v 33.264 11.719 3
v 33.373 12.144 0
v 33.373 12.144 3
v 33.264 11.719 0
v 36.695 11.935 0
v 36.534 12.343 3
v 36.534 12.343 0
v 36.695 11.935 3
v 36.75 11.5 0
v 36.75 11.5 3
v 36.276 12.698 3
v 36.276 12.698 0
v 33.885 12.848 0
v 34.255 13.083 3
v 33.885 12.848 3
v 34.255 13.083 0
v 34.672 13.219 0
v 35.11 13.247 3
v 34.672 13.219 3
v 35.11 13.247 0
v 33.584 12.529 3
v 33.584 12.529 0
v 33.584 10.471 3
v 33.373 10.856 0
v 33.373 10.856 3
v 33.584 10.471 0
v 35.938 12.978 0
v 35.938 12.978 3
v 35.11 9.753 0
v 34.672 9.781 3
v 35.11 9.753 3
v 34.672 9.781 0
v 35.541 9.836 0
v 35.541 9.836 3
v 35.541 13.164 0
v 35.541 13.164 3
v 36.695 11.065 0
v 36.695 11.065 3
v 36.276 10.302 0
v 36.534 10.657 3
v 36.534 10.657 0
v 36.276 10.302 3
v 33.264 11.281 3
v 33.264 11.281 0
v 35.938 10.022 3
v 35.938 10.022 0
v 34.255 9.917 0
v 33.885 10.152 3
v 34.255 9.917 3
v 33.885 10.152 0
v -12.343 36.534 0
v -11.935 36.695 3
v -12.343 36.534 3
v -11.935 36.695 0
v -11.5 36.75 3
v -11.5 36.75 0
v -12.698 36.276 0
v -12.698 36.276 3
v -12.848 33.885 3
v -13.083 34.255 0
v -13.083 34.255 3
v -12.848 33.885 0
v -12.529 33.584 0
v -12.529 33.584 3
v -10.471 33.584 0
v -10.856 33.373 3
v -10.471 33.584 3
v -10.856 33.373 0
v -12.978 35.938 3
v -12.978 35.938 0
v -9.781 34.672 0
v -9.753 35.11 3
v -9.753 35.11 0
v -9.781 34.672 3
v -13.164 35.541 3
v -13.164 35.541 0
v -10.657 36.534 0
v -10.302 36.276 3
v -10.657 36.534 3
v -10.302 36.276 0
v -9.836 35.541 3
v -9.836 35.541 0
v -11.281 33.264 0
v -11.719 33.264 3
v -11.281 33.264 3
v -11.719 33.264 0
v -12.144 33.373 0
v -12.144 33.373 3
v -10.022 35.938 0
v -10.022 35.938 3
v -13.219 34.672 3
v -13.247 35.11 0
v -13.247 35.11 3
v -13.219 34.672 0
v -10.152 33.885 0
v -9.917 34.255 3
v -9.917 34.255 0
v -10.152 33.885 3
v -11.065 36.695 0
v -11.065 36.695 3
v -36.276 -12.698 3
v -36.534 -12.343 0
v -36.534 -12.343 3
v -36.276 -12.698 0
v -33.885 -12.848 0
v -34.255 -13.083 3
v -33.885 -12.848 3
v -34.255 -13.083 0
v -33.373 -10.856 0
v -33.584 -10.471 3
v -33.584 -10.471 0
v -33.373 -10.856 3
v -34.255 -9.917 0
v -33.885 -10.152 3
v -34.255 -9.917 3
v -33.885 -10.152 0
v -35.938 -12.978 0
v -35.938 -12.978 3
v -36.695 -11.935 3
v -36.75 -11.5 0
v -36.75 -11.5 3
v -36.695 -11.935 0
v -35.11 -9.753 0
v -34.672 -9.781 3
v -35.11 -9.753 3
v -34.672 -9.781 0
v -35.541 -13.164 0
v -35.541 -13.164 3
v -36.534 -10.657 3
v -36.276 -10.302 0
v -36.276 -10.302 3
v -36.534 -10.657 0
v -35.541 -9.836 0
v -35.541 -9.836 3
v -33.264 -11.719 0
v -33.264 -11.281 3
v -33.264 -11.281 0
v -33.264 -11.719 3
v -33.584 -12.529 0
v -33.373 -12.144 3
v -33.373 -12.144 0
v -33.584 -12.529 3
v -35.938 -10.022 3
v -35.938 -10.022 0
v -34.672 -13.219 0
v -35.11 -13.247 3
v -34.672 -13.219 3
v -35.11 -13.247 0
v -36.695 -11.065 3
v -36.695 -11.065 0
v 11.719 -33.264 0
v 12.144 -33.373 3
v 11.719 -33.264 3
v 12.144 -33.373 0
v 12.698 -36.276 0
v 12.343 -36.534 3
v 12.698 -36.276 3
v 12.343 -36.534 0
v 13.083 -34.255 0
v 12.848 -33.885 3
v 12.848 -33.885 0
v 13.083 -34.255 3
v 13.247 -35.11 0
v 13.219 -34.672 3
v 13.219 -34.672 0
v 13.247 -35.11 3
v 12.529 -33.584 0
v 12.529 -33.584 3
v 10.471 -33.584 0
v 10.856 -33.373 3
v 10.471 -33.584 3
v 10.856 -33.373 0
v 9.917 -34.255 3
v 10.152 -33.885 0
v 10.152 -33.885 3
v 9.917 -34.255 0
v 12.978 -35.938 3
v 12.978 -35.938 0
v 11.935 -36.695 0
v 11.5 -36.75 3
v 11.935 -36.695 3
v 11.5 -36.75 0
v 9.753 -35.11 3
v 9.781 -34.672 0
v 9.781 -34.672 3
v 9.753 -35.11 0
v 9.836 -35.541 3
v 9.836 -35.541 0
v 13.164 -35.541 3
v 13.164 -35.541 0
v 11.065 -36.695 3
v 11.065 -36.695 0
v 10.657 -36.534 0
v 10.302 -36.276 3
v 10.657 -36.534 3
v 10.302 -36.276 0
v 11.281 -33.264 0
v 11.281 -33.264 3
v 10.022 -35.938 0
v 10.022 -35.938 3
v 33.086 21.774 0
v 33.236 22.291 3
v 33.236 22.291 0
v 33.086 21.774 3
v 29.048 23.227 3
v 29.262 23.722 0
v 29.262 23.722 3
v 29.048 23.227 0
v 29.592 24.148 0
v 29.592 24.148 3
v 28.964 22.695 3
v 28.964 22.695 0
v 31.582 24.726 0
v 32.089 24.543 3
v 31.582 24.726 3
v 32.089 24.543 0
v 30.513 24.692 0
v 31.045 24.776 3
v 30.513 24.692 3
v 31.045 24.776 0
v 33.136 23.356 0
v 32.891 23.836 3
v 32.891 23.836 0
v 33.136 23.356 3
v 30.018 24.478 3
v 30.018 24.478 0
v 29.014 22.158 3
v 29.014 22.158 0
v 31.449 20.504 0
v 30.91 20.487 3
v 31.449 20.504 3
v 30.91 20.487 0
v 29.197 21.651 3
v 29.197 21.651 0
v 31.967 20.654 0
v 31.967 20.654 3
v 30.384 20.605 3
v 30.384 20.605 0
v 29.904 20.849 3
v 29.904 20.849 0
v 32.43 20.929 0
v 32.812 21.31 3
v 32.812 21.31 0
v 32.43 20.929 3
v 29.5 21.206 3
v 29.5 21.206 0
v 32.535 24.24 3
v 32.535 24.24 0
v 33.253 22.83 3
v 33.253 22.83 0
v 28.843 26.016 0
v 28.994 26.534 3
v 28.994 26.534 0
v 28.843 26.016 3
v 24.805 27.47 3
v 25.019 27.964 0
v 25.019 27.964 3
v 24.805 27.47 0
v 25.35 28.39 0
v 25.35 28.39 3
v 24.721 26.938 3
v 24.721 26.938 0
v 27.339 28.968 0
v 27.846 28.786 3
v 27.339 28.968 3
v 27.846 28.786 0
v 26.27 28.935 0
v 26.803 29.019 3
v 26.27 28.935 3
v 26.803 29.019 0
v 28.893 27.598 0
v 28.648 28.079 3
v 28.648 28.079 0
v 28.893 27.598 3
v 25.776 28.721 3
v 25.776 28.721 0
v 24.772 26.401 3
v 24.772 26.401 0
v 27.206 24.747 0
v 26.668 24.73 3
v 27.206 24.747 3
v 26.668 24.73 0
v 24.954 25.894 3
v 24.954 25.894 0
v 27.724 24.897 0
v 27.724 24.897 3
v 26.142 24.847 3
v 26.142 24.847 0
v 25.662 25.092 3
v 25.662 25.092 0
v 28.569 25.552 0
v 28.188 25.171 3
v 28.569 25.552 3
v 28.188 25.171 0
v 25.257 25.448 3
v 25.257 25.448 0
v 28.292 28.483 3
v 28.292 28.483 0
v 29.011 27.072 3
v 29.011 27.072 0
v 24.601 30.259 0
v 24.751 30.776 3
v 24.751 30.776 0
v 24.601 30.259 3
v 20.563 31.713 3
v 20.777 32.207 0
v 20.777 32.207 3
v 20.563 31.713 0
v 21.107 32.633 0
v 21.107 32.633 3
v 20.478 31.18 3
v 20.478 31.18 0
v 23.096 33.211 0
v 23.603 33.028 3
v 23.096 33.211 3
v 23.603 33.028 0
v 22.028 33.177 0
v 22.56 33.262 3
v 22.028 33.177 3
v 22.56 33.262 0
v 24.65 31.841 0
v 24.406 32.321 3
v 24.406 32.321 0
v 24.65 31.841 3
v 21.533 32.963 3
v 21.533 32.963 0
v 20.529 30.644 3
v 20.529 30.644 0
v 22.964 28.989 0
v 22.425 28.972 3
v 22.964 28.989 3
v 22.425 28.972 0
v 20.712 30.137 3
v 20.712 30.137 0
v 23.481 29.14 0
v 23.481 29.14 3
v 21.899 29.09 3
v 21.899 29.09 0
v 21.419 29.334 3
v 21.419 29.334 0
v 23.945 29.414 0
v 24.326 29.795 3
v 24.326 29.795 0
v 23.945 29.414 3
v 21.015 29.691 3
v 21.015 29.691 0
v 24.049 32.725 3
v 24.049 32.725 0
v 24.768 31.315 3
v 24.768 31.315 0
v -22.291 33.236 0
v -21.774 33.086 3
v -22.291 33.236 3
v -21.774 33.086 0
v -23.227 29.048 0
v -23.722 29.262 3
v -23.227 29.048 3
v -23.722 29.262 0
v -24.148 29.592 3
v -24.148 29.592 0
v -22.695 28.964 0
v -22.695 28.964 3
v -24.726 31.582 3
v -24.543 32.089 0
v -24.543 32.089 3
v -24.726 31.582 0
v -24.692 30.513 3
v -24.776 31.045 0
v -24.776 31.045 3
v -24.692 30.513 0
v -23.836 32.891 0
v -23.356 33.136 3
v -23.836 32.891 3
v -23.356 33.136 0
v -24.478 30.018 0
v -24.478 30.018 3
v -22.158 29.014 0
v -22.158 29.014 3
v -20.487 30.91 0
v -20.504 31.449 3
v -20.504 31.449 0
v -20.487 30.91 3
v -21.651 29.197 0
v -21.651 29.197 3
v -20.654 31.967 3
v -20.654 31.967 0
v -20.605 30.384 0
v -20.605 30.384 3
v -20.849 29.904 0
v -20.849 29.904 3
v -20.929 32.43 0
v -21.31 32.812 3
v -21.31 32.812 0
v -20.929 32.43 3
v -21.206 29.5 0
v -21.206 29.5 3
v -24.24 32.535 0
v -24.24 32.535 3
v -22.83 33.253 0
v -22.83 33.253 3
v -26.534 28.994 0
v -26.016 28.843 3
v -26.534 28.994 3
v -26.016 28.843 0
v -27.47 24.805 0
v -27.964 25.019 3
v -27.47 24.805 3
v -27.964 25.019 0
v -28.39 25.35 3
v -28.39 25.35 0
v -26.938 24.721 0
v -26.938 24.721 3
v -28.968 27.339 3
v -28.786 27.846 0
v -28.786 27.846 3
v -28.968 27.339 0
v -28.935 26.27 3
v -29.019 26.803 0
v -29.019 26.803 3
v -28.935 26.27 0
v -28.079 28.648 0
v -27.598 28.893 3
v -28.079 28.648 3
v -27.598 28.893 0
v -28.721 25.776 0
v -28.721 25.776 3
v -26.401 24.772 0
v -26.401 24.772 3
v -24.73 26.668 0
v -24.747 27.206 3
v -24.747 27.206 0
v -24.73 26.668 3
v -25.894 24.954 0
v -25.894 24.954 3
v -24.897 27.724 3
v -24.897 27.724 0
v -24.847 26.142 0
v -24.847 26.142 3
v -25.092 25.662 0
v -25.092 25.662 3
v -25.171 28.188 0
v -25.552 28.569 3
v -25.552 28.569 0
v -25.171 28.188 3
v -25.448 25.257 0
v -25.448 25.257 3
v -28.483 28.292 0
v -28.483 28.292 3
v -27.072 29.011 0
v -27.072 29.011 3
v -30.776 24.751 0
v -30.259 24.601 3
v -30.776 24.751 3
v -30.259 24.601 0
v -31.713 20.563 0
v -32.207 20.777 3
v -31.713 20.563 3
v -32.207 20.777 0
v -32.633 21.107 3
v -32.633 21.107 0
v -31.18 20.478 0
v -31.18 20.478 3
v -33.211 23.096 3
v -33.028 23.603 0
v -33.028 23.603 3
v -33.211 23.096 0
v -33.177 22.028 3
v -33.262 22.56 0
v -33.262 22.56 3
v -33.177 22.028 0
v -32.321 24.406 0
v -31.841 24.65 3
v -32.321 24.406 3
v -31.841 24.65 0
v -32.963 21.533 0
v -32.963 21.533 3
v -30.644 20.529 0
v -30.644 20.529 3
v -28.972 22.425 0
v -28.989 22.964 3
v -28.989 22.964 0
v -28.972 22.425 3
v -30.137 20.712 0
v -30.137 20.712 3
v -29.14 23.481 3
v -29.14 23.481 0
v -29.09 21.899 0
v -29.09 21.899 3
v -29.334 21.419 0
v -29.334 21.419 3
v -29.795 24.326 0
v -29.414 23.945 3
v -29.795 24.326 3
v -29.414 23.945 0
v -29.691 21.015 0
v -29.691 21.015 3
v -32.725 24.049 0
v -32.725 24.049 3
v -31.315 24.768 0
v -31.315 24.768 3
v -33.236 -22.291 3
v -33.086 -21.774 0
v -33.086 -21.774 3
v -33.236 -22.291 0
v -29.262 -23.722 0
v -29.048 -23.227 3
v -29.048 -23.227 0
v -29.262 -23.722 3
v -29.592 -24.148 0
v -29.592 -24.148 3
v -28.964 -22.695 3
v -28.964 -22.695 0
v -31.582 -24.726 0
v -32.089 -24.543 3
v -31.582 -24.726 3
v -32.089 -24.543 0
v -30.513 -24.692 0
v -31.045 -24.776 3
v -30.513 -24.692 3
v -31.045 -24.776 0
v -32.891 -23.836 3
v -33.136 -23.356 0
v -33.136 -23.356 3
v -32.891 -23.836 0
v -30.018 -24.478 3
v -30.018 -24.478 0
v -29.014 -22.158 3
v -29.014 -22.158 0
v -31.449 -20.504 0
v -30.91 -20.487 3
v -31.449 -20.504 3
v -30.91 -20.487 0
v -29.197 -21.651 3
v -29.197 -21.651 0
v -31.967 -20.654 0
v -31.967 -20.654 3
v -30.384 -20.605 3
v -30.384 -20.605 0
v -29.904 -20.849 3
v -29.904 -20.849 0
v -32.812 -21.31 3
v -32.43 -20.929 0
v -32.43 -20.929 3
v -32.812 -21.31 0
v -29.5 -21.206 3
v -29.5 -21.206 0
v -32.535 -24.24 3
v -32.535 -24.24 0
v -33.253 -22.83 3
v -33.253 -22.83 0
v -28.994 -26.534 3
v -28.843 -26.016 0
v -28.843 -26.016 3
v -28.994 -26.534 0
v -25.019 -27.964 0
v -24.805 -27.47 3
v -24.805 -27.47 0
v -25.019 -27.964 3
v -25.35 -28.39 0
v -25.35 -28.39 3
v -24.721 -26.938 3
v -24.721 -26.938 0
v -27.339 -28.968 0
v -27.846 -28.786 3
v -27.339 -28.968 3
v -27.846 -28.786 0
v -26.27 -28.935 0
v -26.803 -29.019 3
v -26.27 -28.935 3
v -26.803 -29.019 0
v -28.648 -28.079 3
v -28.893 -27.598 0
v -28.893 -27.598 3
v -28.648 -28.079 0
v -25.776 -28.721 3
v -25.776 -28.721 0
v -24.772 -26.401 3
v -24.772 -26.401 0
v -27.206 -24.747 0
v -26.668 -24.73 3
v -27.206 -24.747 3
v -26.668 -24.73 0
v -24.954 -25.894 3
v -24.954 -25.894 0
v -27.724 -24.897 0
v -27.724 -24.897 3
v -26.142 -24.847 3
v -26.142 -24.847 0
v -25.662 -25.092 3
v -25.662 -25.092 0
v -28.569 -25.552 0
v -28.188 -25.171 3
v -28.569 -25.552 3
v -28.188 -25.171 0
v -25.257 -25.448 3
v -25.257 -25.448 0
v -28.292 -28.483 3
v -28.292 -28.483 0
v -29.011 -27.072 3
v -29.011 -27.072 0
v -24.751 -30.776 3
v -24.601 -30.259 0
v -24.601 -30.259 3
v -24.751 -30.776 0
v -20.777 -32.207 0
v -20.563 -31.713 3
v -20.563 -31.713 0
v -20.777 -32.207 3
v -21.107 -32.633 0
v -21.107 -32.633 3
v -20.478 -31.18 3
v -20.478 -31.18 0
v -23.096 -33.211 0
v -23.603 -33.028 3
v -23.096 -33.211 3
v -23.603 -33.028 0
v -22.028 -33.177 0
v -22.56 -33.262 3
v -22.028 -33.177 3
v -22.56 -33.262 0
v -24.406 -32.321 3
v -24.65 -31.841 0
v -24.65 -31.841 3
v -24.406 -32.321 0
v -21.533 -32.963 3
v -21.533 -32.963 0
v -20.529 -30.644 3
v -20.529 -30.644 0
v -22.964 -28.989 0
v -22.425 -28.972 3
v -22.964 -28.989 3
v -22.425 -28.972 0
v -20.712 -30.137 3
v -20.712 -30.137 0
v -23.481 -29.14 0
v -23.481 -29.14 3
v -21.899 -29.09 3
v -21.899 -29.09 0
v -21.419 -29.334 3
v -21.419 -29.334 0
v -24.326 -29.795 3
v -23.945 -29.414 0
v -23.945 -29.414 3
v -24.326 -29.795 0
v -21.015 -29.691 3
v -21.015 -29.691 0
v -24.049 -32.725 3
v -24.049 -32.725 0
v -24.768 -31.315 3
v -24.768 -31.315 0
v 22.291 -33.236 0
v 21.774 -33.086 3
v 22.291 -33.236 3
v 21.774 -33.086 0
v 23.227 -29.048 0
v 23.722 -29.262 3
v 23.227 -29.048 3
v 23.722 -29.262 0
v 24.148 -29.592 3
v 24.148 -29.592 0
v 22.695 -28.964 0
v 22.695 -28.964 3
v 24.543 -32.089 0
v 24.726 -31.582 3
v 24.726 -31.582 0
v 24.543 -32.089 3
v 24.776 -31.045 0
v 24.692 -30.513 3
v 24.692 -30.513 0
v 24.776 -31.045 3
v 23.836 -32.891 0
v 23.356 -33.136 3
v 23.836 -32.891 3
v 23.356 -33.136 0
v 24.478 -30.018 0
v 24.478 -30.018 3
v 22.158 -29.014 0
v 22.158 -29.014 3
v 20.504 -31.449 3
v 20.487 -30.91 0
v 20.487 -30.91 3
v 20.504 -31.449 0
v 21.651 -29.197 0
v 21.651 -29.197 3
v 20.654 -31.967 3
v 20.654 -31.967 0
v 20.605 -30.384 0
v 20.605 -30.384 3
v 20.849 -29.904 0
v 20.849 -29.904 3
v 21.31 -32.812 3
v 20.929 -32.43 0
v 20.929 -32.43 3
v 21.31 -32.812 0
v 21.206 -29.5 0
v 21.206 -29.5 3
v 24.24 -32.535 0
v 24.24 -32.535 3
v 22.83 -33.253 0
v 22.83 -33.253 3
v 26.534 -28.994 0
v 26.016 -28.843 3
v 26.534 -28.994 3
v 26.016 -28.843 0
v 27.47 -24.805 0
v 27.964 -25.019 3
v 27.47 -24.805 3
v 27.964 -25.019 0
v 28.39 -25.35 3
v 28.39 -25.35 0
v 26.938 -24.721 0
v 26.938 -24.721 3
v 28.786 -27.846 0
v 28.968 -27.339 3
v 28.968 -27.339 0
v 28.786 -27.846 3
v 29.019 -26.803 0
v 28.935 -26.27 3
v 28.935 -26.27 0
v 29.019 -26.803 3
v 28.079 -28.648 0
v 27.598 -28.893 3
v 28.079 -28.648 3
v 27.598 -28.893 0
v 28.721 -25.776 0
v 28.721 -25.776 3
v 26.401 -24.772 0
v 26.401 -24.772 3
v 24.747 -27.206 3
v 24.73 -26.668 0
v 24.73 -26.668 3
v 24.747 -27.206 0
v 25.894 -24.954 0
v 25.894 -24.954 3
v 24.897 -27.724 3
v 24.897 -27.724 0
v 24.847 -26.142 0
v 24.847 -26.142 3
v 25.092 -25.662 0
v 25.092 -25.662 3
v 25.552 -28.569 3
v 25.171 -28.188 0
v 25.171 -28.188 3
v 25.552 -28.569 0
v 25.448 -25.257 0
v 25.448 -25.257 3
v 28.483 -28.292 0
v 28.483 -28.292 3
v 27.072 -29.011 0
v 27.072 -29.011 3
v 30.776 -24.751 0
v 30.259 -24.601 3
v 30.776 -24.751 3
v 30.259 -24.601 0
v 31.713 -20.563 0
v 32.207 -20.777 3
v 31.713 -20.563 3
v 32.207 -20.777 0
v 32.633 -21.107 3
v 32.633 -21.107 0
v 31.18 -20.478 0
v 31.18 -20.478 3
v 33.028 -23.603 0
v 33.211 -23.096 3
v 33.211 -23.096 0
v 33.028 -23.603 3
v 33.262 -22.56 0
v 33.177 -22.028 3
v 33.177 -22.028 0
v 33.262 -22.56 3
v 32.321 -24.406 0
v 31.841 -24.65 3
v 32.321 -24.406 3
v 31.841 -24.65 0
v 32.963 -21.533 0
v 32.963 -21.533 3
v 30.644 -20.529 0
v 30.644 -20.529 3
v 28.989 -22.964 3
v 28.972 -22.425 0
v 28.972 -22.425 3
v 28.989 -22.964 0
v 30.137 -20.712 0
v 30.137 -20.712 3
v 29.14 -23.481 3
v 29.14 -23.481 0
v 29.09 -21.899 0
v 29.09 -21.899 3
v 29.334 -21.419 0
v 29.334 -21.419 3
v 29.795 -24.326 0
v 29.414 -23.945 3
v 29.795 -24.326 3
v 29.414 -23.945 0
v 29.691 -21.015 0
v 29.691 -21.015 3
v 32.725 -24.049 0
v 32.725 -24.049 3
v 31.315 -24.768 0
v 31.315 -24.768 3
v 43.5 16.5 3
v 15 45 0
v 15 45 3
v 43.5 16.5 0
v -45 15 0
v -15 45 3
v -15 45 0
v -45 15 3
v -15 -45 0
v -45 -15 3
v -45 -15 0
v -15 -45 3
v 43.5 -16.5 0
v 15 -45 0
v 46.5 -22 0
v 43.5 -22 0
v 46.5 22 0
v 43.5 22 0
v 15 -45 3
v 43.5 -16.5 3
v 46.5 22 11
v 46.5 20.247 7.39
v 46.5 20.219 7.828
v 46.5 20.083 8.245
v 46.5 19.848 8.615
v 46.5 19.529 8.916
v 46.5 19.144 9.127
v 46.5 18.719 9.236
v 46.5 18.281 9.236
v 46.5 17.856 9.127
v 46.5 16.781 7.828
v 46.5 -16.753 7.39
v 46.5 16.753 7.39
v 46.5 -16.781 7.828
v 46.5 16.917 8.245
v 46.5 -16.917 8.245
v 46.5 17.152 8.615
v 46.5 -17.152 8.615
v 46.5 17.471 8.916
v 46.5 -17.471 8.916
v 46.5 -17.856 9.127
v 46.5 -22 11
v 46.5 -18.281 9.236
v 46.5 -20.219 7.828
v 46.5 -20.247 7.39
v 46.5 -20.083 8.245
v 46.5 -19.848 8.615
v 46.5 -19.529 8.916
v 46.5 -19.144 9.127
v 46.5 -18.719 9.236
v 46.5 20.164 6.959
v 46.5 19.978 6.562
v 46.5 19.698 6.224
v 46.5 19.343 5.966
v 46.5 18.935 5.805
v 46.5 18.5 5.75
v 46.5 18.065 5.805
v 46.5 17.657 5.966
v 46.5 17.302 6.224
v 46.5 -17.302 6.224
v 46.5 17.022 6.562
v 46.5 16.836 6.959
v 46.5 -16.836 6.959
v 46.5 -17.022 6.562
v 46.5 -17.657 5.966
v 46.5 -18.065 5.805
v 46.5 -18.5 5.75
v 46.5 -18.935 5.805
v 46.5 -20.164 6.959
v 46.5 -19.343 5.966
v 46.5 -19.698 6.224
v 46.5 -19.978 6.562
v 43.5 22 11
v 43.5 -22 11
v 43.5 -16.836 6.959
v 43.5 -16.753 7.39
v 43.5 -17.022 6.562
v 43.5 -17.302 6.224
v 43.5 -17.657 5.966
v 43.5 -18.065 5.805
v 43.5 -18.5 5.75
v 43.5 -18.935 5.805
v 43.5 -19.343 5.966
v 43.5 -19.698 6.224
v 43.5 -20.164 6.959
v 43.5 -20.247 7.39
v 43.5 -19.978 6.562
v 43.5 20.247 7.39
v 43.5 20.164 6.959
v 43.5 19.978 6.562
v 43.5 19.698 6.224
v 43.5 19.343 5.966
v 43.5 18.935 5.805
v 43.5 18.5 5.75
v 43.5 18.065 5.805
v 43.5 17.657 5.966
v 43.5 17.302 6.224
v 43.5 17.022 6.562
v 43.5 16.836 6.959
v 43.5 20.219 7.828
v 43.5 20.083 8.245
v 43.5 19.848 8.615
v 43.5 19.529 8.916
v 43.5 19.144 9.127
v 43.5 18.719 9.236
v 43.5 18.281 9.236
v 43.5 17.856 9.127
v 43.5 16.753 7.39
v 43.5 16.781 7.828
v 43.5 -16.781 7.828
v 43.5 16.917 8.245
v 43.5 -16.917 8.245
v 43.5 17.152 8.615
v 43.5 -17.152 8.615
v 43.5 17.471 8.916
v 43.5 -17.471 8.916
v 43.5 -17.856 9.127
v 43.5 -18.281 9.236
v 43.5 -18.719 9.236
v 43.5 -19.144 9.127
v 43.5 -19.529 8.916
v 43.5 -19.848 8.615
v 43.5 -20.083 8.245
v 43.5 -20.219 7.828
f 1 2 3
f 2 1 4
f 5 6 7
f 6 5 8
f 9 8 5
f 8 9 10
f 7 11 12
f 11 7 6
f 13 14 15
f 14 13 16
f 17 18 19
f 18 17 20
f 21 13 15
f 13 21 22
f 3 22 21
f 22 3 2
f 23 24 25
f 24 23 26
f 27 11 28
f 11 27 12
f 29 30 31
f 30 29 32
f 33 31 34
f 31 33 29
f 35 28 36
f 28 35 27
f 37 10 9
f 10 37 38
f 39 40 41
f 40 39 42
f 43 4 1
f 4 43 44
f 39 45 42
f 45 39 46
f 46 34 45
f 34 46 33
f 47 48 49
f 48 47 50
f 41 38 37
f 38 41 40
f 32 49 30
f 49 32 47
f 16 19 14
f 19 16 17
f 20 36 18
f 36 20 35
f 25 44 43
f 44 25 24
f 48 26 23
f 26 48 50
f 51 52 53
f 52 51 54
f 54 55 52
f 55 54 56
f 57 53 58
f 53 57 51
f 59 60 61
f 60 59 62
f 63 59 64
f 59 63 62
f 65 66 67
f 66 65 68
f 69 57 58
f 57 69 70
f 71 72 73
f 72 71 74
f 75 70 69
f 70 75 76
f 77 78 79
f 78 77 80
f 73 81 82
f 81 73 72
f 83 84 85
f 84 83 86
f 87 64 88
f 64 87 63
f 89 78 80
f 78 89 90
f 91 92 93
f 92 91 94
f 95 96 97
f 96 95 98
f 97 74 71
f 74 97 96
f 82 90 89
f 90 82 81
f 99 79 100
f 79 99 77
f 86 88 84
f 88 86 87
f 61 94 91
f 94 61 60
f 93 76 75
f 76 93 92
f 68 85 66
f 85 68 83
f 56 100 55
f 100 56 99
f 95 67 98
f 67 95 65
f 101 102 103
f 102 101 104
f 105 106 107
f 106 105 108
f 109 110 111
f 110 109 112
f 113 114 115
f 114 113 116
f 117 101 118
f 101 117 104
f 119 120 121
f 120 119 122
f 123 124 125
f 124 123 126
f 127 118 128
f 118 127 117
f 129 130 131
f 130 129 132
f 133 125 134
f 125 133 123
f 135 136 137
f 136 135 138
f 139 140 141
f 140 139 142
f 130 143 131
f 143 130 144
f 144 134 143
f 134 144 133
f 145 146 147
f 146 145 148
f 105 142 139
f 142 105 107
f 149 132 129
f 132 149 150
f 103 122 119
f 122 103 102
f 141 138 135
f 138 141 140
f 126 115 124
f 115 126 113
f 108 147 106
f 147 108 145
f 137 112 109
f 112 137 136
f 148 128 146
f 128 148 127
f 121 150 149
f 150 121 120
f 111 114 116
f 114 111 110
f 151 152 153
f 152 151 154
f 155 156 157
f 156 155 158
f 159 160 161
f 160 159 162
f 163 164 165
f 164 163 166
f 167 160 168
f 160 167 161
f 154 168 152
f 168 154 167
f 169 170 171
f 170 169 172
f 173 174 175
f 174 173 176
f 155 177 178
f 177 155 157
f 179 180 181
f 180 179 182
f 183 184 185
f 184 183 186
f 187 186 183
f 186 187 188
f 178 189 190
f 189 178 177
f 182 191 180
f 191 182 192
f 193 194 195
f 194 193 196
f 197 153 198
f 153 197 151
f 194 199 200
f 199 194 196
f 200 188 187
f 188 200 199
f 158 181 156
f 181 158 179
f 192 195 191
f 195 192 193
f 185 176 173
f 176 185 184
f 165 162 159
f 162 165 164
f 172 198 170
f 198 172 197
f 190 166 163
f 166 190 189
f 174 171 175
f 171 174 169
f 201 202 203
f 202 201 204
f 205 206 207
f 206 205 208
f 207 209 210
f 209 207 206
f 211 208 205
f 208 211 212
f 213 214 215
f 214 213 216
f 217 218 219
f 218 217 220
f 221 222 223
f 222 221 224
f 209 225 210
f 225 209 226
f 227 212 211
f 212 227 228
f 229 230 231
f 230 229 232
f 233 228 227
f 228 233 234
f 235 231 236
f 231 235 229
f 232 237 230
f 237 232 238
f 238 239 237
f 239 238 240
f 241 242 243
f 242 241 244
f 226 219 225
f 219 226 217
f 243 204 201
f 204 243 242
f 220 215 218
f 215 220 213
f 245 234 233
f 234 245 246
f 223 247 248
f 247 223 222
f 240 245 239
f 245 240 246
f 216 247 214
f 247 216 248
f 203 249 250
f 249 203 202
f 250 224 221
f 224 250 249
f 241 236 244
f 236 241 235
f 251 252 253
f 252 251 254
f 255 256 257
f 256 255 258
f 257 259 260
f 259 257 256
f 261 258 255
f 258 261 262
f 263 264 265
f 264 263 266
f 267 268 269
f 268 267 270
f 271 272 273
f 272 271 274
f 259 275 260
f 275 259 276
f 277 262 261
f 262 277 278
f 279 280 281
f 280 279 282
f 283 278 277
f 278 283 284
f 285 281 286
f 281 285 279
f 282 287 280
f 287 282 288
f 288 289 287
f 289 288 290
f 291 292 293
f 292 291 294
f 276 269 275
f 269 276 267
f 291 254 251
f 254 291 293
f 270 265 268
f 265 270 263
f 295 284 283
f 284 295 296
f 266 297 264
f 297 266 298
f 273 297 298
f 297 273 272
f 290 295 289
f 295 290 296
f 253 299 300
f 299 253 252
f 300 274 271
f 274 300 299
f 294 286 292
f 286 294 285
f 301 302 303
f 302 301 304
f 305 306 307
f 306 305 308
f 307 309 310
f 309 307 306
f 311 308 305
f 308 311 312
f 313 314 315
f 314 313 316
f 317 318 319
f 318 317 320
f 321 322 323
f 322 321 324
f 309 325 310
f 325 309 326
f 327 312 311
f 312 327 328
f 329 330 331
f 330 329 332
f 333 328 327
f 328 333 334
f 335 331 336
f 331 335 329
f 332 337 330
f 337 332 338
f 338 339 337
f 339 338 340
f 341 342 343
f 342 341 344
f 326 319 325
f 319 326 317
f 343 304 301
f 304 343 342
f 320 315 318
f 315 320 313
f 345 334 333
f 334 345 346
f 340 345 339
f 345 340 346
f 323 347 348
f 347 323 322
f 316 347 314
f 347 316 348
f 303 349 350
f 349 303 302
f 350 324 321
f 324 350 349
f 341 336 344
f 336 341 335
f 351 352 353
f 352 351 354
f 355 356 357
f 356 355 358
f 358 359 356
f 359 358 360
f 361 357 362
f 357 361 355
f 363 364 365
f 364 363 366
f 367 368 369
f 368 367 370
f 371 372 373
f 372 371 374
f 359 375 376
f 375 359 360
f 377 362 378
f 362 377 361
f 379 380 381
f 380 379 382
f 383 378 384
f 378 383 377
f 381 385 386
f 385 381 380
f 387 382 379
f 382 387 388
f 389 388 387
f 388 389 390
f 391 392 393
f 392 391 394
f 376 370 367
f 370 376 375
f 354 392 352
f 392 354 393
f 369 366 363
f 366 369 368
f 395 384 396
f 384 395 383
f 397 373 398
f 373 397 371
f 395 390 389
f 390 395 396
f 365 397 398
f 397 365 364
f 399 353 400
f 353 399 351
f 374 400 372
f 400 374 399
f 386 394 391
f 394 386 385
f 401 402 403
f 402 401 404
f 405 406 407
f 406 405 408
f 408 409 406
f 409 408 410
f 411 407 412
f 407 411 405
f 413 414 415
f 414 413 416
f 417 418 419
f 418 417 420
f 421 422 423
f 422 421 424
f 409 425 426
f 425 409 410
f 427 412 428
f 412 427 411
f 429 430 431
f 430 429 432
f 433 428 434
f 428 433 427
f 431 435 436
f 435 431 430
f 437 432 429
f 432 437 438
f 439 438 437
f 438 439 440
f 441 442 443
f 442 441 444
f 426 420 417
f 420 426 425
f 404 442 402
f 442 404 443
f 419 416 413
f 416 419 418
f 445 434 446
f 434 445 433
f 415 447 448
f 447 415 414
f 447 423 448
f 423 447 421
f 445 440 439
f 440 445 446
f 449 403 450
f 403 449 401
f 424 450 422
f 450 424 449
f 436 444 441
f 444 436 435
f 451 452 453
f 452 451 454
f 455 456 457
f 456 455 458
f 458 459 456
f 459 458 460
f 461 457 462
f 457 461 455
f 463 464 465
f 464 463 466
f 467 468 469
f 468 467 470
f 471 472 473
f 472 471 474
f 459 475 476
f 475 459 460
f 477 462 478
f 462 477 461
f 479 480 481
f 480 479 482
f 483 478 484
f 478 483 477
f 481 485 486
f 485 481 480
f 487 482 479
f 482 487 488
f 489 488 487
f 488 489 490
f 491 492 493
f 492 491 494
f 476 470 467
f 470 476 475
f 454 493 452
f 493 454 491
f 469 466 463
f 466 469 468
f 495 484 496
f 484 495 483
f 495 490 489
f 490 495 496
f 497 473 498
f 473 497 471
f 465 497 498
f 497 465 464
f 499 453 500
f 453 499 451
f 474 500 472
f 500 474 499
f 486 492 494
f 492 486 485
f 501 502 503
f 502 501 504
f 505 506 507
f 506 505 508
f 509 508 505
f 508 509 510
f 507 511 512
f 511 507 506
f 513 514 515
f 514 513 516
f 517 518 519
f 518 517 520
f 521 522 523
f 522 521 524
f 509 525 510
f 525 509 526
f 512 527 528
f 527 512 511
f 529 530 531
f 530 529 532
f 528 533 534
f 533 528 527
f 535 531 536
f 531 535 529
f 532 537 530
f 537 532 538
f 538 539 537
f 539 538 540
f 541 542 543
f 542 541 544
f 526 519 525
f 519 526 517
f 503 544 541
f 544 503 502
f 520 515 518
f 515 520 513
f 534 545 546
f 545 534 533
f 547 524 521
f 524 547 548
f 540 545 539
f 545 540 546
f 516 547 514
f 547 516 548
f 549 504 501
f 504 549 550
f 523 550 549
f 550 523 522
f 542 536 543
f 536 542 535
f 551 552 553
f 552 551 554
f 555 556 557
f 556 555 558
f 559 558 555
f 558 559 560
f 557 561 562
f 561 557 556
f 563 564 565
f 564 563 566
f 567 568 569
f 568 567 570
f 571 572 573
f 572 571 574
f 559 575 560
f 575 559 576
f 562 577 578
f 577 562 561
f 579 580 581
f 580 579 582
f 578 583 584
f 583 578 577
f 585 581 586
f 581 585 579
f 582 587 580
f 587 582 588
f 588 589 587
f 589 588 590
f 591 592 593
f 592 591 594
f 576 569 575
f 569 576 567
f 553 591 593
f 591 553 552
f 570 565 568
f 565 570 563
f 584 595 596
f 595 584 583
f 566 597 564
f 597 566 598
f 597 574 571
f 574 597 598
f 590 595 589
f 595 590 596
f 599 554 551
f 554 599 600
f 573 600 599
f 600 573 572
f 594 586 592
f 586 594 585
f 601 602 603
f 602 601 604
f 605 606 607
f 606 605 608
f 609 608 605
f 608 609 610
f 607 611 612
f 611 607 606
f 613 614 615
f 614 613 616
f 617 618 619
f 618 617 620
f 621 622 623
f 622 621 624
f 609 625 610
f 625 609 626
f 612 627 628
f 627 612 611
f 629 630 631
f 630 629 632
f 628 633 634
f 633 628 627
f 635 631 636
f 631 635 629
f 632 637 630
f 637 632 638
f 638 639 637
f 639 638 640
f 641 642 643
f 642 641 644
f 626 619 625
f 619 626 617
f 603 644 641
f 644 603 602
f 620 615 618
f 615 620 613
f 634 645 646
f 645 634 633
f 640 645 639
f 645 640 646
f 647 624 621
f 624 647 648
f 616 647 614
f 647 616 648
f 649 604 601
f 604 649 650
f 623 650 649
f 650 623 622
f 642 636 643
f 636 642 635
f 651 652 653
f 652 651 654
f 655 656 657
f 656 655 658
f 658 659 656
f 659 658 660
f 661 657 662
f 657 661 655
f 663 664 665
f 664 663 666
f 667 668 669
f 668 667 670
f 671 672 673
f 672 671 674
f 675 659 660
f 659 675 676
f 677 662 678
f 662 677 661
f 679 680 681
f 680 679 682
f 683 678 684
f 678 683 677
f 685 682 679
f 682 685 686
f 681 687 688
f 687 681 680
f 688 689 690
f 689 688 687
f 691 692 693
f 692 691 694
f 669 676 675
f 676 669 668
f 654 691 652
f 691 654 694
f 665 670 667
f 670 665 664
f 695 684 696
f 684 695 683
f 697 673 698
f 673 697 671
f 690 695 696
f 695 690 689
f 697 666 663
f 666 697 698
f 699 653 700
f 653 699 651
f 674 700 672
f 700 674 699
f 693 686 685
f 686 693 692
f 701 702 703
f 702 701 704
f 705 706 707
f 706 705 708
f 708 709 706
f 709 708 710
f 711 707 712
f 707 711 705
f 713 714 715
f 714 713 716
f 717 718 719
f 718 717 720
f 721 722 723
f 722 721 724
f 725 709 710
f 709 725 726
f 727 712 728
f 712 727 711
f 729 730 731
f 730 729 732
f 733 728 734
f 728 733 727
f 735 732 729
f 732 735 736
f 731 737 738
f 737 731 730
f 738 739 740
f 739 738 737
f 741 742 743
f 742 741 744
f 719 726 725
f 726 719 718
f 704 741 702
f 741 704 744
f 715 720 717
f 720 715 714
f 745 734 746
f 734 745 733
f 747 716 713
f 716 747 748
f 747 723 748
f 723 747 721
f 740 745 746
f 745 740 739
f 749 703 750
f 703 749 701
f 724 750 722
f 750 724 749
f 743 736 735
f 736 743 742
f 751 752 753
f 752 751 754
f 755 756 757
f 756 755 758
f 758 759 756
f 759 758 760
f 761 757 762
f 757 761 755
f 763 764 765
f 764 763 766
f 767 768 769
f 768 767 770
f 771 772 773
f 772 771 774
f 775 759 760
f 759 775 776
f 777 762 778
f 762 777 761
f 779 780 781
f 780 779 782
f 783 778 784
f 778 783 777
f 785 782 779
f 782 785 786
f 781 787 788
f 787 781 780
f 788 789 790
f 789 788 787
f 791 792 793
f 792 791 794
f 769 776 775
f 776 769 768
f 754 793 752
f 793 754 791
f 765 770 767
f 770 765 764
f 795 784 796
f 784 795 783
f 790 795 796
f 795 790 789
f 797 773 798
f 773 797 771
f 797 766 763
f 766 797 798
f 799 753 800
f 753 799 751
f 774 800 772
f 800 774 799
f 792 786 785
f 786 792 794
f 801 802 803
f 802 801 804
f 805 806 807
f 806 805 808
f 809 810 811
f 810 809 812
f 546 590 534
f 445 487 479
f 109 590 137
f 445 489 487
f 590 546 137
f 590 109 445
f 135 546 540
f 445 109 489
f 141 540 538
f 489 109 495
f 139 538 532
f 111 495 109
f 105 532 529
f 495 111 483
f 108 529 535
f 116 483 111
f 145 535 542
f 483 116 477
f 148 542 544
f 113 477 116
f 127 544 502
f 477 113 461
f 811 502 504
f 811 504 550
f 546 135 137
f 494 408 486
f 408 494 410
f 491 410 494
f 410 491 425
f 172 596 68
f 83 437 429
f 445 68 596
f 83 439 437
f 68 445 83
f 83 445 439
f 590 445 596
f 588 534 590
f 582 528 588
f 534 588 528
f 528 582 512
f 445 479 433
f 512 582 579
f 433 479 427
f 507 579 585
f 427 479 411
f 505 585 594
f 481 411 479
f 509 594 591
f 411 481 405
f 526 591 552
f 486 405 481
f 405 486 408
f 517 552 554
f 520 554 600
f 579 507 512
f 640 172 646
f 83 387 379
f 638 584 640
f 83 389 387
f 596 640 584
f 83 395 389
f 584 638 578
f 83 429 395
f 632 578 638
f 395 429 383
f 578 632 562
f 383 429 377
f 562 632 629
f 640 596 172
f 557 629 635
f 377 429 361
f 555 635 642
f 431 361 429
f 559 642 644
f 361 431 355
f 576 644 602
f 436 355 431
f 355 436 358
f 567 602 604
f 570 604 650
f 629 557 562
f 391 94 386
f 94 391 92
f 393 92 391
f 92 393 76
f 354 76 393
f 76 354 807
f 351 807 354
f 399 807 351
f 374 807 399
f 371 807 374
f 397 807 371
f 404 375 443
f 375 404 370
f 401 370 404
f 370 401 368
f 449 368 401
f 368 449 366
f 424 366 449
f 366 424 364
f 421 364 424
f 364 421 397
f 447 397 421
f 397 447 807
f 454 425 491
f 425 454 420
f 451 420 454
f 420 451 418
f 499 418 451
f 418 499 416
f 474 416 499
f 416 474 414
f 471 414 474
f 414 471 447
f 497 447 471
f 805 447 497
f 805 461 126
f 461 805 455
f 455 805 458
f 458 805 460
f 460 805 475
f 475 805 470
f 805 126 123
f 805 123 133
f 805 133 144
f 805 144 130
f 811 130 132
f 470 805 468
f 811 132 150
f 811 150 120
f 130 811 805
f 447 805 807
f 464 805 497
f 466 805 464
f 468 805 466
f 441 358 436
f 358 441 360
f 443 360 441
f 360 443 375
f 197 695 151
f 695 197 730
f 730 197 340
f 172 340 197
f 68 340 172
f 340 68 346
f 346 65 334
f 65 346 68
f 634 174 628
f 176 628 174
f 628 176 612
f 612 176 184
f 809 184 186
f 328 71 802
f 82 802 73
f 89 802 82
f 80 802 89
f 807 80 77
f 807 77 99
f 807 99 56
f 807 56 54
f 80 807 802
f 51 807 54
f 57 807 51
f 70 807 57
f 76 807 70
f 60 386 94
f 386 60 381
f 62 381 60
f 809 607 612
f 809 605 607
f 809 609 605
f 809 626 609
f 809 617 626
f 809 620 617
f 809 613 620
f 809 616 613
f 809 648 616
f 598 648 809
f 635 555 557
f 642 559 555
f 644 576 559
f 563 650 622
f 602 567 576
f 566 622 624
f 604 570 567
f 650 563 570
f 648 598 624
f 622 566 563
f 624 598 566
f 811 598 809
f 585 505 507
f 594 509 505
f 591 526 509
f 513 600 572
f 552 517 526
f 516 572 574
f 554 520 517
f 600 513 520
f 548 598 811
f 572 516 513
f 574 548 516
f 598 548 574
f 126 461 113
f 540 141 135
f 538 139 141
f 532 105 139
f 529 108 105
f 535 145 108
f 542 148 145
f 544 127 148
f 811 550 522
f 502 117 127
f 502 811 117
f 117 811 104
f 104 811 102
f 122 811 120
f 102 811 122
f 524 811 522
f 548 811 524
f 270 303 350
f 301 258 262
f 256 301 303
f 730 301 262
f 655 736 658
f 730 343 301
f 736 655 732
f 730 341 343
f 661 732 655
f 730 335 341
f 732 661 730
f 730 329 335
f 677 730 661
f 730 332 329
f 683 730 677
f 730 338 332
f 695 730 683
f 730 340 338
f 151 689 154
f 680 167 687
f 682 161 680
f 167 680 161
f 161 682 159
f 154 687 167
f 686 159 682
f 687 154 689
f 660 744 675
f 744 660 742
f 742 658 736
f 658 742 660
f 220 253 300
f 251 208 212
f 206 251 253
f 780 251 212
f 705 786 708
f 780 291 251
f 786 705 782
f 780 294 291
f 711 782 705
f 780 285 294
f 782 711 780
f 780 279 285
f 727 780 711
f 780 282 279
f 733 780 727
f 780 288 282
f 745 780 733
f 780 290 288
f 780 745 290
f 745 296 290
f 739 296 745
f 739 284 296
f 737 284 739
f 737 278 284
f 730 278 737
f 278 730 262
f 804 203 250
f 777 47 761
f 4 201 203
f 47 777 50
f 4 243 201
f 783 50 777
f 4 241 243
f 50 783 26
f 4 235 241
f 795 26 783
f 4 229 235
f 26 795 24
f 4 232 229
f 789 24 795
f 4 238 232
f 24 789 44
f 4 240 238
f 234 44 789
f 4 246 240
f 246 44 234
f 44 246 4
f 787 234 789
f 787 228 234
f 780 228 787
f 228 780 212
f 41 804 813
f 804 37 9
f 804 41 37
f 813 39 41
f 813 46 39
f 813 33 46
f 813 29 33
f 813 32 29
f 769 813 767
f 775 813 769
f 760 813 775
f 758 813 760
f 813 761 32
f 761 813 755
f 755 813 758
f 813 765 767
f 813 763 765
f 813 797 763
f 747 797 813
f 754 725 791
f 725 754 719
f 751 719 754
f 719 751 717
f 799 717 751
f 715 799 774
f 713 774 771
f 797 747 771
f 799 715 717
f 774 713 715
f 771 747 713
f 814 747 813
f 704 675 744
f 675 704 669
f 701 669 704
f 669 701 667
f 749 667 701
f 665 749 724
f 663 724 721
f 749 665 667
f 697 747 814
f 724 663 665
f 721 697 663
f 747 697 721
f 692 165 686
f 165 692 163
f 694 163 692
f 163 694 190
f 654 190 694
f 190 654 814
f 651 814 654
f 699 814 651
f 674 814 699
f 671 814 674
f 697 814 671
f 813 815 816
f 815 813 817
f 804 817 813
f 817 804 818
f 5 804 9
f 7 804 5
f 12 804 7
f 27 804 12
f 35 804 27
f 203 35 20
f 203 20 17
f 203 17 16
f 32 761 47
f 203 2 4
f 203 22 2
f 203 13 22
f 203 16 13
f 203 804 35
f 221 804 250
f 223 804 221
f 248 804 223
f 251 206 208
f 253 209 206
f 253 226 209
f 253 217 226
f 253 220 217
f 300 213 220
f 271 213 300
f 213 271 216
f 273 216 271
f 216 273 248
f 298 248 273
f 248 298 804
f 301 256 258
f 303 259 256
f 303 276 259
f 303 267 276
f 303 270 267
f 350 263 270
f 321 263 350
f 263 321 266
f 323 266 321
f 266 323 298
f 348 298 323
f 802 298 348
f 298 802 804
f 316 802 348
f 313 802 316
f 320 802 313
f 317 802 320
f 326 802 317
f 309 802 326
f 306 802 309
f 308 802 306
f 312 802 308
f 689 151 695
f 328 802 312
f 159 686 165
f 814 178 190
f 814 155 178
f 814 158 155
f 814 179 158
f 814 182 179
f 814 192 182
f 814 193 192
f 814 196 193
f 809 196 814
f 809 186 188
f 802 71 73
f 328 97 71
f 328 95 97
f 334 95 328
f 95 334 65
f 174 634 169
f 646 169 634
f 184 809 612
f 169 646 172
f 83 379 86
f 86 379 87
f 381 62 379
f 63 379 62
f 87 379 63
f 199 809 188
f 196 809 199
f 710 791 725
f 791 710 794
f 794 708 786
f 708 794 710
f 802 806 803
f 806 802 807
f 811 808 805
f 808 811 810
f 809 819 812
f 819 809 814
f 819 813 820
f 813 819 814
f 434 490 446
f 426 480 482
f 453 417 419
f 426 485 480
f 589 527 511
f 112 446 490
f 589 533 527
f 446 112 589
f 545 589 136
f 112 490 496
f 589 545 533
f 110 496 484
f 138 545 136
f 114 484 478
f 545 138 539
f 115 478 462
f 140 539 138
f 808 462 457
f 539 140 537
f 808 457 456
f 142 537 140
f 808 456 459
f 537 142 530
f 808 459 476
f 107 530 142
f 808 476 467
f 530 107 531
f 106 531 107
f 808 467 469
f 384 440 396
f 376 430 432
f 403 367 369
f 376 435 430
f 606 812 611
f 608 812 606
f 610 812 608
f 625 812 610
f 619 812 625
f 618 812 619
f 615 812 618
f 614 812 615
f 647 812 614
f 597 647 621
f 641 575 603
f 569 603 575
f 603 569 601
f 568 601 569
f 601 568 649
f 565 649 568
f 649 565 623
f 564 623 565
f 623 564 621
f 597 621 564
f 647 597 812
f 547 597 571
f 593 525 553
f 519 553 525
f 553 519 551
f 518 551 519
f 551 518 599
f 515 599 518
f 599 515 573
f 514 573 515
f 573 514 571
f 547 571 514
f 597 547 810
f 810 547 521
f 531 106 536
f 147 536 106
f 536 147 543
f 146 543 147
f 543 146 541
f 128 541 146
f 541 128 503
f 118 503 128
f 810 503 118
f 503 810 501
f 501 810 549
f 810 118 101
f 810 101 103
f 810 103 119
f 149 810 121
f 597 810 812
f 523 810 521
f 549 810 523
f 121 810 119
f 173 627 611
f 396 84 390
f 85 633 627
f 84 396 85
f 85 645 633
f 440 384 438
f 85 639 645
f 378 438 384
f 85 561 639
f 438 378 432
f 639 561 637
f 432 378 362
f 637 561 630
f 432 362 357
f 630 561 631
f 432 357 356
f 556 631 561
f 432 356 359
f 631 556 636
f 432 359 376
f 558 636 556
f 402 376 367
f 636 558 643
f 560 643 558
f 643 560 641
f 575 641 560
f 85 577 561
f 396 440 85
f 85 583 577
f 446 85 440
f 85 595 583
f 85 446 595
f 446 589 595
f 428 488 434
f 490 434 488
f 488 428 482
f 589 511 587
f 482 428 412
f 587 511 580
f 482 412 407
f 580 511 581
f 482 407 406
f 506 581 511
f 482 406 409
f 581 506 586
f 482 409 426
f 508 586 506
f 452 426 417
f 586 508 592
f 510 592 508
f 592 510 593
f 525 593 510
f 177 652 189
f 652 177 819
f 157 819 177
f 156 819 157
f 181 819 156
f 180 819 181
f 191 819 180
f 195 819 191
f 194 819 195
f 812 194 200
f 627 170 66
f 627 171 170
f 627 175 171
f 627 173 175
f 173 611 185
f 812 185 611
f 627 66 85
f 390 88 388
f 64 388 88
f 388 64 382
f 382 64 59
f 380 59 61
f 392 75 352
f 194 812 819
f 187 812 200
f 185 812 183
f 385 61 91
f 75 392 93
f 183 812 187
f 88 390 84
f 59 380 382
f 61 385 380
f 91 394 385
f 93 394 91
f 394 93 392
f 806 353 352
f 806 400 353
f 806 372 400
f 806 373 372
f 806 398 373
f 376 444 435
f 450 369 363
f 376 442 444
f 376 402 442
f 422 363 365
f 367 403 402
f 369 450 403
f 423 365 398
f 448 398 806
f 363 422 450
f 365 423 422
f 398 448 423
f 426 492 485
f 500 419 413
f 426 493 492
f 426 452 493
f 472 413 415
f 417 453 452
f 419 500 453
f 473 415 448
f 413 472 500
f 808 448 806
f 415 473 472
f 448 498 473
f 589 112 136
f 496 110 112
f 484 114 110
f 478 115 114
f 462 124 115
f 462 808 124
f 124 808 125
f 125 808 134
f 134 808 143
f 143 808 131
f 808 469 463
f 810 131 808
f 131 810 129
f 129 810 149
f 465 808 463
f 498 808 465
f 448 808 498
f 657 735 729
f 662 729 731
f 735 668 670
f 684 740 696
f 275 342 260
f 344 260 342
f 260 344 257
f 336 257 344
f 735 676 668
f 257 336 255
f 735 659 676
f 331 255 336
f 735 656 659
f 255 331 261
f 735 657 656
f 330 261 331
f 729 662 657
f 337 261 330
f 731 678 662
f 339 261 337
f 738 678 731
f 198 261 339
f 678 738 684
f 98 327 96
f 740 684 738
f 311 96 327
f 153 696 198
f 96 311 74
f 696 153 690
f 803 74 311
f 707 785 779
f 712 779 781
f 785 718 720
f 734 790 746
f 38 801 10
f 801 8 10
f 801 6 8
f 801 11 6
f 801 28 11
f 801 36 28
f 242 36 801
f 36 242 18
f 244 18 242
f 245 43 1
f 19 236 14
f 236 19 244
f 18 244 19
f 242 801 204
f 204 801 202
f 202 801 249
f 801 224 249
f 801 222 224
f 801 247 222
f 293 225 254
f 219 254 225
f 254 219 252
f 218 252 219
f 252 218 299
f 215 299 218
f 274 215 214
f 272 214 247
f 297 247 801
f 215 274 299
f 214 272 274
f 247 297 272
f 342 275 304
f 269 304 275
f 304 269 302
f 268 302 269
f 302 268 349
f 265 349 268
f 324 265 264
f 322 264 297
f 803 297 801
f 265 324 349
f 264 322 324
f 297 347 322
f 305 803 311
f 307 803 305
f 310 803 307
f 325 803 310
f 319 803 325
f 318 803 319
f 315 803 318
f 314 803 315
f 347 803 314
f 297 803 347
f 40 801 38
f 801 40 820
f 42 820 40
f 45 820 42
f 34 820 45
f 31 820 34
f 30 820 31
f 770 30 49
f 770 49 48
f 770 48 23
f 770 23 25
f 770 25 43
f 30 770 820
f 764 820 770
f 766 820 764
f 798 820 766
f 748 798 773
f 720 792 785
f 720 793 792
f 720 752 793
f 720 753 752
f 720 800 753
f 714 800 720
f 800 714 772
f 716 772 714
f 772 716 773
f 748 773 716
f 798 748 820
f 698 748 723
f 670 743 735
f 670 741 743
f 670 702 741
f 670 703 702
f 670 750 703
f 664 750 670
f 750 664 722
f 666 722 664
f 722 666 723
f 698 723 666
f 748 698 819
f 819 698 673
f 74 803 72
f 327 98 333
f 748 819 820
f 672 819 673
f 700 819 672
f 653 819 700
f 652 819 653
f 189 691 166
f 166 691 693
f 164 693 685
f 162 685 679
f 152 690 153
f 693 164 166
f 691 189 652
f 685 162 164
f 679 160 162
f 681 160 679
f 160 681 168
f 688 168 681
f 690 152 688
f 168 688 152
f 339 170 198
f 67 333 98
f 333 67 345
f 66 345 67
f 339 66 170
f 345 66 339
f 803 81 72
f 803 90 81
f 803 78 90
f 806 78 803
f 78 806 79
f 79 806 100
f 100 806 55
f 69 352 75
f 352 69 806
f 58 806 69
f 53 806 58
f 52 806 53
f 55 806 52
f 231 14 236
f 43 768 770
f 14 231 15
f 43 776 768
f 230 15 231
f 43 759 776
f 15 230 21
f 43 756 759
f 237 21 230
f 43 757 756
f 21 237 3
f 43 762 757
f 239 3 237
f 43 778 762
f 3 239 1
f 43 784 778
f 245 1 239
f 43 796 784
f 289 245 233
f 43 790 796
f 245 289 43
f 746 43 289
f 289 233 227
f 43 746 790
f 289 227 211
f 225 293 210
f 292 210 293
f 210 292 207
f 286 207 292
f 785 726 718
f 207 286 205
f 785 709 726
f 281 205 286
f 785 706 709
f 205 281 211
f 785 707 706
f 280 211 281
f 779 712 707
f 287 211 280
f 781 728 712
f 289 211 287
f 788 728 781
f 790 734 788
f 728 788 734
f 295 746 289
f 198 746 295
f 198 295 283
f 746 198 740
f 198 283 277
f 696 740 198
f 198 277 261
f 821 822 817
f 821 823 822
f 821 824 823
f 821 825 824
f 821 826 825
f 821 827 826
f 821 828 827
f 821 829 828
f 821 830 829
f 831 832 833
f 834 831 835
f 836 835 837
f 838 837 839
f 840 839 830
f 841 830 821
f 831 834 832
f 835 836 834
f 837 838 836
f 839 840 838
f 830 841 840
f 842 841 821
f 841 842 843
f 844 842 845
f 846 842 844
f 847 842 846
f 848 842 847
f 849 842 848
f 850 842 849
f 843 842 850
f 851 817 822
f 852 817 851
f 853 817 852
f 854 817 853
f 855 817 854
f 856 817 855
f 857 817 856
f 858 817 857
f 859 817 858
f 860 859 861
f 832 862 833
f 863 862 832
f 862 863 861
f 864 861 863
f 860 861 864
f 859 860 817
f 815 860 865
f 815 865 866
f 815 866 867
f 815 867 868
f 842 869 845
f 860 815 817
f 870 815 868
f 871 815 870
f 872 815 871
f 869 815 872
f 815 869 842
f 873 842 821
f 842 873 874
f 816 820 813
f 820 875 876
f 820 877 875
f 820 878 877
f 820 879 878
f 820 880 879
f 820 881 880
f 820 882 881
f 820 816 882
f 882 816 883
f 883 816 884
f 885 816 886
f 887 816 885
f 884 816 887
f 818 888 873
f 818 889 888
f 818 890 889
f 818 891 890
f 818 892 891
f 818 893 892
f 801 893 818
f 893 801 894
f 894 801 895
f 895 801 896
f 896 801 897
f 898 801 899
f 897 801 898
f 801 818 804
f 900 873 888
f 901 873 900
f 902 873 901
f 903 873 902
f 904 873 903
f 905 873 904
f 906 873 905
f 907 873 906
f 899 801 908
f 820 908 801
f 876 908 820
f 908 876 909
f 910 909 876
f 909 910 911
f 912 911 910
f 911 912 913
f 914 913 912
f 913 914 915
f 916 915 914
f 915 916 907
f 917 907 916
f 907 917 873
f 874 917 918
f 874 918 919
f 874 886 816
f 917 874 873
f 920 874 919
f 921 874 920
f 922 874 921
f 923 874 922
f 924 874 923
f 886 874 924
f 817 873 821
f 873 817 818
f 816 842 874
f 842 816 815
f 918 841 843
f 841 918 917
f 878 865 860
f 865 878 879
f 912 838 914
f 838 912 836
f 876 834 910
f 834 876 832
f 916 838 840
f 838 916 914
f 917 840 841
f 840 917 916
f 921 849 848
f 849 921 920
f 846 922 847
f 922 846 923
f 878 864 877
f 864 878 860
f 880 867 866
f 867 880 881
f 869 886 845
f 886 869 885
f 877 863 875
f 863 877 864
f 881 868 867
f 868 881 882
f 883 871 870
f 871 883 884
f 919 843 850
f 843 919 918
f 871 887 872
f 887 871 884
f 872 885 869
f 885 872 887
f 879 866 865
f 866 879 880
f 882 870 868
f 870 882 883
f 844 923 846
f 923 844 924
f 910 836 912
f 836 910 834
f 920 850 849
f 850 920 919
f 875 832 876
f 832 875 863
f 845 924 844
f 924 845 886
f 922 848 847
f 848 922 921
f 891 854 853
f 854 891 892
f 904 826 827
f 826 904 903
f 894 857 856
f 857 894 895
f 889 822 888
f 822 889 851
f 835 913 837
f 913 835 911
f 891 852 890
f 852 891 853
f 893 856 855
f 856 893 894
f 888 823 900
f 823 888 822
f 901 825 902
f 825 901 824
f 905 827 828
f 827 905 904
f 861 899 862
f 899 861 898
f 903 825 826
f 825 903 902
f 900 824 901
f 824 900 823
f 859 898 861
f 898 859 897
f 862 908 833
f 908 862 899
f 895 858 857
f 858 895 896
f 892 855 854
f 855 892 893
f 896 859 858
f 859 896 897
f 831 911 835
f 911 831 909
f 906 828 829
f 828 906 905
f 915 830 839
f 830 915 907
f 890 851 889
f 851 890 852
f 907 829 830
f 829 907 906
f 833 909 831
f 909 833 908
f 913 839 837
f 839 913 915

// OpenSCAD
// file: ../../util/rounded.scad
// Do a rounded cube
module rounded(x=10, y=10, z=10, r=3, center=false) {
  if (center) {
    translate([-(x/2),-(y/2),0])
      rounded(x, y, z, r);
  } else {
    translate([r,r,0])
    minkowski() {
      cube([x-2*r,y-2*r,z/2]);
      cylinder(h=z/2, r=r);
    }
  }
}
// file: ../../util/hole3.scad
module hole3()
{
    cylinder(d=3.5, h=99, center=true);
}
// file: ../../util/repeat4.scad
module repeat4()
{
    for (r=[0:3])
    rotate([0,0,90*r])
    children();
}
// file: ../../util/octopath.scad
// Follow an octogonal path
module octopath(X, Y, thickness, center=false)
{
    union() {
        linear_extrude(thickness, center=center)
            polygon(points=[
                    [X, Y], [X, -Y], 
                    [Y, -X], [-Y, -X],
                    [-X, -Y], [-X, Y],
                    [-Y, X], [Y, X], 
            ]);
    }
}
// file: ../../models/ollo.scad
// Diameter of plastic ollo holes
OlloHoles = 4.3;

// Width of Ollo "real" plastic
OlloWidth = 3;

// Distance between two ollo holes
OlloSpacing = 6;

// Do an Ollo hole on the part
module olloHole(depth=2.2)
{
    translate([0,0,-0.1])
      cylinder(depth+0.2, OlloHoles/2, OlloHoles/2);
}

// Do 3 ollo holes
module threeOllo(depth=2.2)
{
  for (xy=[[-OlloSpacing,0],[0,0],[OlloSpacing,0]]) {
    translate([xy[0], xy[1], 0])
    olloHole(depth);
  }
}

// Do a servo arm holes
module servoArm(depth=2.2)
{
    threeOllo(depth);
    rotate([0,0,90])
      threeOllo(depth);
}
// file: ../../parts/leg.scad
use <../models/ollo.scad>;
use <../util/rounded.scad>;

module leg(sizeA=60, sizeB=20, sizeC=20, sizeBottom=10,
        sizeTop=15, thickness=2.2, print=false)
{
    xOffset = 0;
    spacing = 30;

    module legSide()
    {
        difference() {
            union() {
                translate([0,0,sizeA/2])
                    rotate([0,90,0]) {
                        cube([sizeA, 20, thickness], center=true);
                    }
            }
            translate([-thickness, 0, sizeA-15]) {
                rotate([90,0,90]) {
                    servoArm(2*thickness);
                }
            }
        }
        translate([-thickness/2,0,sizeA]) {
            rotate([90,0,90])
                linear_extrude(thickness)
                polygon([[-10,0],[-1,sizeTop],[1,sizeTop],[10,0]]);
        }
    }

    module biais() {
        Dx = (spacing-sizeBottom)/2;
        Dy = sizeC;
        Dl = sqrt(pow(Dx,2)+pow(Dy,2));

        translate([-(spacing/2)-thickness,-10,-(sizeB+thickness/2)])
            rotate([0,atan2(Dy,Dx),0])
            cube([Dl,20,thickness]);
    }

    if (print) {
        translate([0,0,10-xOffset])
            rotate([90,0,0])
            leg(sizeA, sizeB, sizeC, sizeBottom,
                    sizeTop, thickness, false);
    } else {
        echo("[PART] leg");
        translate([0,xOffset,-sizeA+15]) {
            cube([spacing+thickness*2, 20, thickness], center=true);

            translate([spacing/2+thickness/2,0,0])
                legSide();
            translate([-(spacing/2+thickness/2),0,0])
                legSide();

            translate([0,0,-sizeB])
                cube([spacing+thickness*2, 20, thickness], center=true);
            translate([spacing/2+thickness/2,0,-sizeB/2])
                cube([thickness,20,sizeB], center=true);
            translate([-(spacing/2+thickness/2),0,-sizeB/2])
                cube([thickness,20,sizeB], center=true);

            translate([0,0,-(sizeB+sizeC)])
                cube([sizeBottom+thickness*2, 20, thickness], center=true);

            biais();
            mirror([1,0,0]) {
                biais();
            }
        }
    }
}

leg();
// file: ../../parts/side.scad
include <../models/ollo.scad>;
use <../util/rounded.scad>;

module side(size=40, holesToBorder=5, thickness=2.2, print=false) {
    if (print) {
        translate([0,-size+holesToBorder,0])
            side(size,holesToBorder,thickness,false);
    } else {
        echo("[PART] side");
        translate([0,size-holesToBorder,0]) {
            difference() {
                rounded(20, size*2, thickness, 5, true);
                for (y=[size-holesToBorder,	 -size+holesToBorder,
                        size-holesToBorder-3*OlloSpacing, -size+holesToBorder+3*OlloSpacing]) {
                    translate([0, y, 0])
                        threeOllo();
                }
            }
        }
    }
}

side();
// file: ../../parts/u.scad
use <../models/ollo.scad>;

module u(height=15, radius=8, thickness=2.2, screwsSpacing=10, screwsDiameter=2.6, screws=true, olloScrew=false, widthSize=15, print=false) {
    module Ubranch() {
        union() {  
            cylinder(thickness, 10, 10);
            translate([-10,0,0])
                cube([20, height, thickness]);
        }
    }

    module USide() {
        difference() {
            union() {
                Ubranch();
                translate([-10,height+radius-thickness,radius])
                    cube([20,thickness,widthSize-(radius-thickness)]);
                translate([-10,height,radius]) {
                    rotate([0,90,0]) {
                        difference() {
                            cylinder(20,radius,radius);
                            translate([0,0,-1])
                                cylinder(22,radius-thickness,radius-thickness);
                            translate([-10+radius-thickness,-10,-1])
                                cube([10,10,22]);
                            translate([-10,-20+radius-thickness,-1])
                                cube([10,20.01,22]);
                        }
                    }
                }
            }
            servoArm(depth=6);
        }
    }

    module UScrews() {
        for (x=[-screwsSpacing/2,screwsSpacing/2]) {
            for (y=[-screwsSpacing/2,screwsSpacing/2]) {
                rotate([270,0,0])
                    translate([x,y,0])
                    cylinder(d=screwsDiameter, h=100);
            }
        }
    }

	module UOllo() {
		rotate(-90, [1,0,0])
			servoArm(2*height);
	}

    if (print) {
        translate([0,0,10])
            rotate([0,90,0])
            u(height,radius,thickness,screwsSpacing,screwsDiameter,
                screws,olloScrew,widthSize,false);
    } else {
        echo("[PART] u");
        difference() {
            translate([0,0,-widthSize-thickness]) {
                USide();
                mirror([0,0,1]) translate([0,0,-2*thickness-2*widthSize])  
                    USide();
            }
            if (screws) {
                UScrews();
            }
            if (olloScrew) {
                UOllo();
            }
        }
    }
}

u();
// file: ../../parts/head.scad
use <../models/ollo.scad>;
use <../util/octopath.scad>;
use <../util/repeat4.scad>;
use <../util/hole3.scad>;

$fn=25;

module head(height=25, thickness=2.2, print=false) {
    // The layout path
    X=48;
    Y=18;

    if (print) {
        translate([0,0,height])
        rotate([-180,0,0])
        head(height, thickness, false);
    } else {
        difference() {
            union() {    
                difference() {    
                    octopath(X, Y, thickness=height);
                    
                    // Craving the inside
                    translate([0,0,-0.1])
                    octopath(X-thickness, Y+3, thickness=height-thickness);
                }
        
                // If you don't have spacer, you can uncomment this and use long
                // screws
                /*
                repeat4()
                translate([41,0,0])
                difference() {
                    translate([0,0,10])
                    cylinder(d=6, h=height-10);
                    translate([0,0,-1])
                    cylinder(d=4, h=height-10);
                }
                */
            }
            
                    
            // Holes for magnets
            repeat4()
            translate([41,0,0])
            hole3();
        }
    }
}

head(thickness=2.2);
// file: ../../parts/body.scad
use <../models/ollo.scad>;
use <../util/octopath.scad>;
use <../util/repeat4.scad>;
use <../util/hole3.scad>;

$fn=25;

module body(thickness=2.2, type="top", print=false) {
    // The layout path
    X=45;
    Y=15;
    
    difference() {
        // Making the exernal path
        octopath(X, Y, thickness=thickness);
        
        if (type == "top") {
            // Craving the board to make it accessible
            octopath(X-8, Y-8, thickness=99, center=true);
            
            // Adding holes for the magnets
            repeat4()
            translate([41,0,0])
            hole3();
        } else if (type == "bottom") {
            // Adding holes for the XBoard
            repeat4()
            translate([35, 11.5, 0])
            hole3();
        }
        
        // Motors fixation
        repeat4()
        rotate([0,0,45])
        translate([38,0,0])
        rotate([0,0,90])
        threeOllo(thickness);
    }

    if (type == "bottom") {    
        // GP-2 fixation
        translate([X,0,5.5])
        difference() {
            cube([thickness, 44, 11], center=true);
            
            translate([0,-37/2,2])
            rotate([0,90,0])
            hole3();
            
            translate([0,37/2,2])
            rotate([0,90,0])
            hole3();
            
        }
    }
}


body();
// file: ../../util/screws.scad
module screws(count=4, radius=5, size=3.3, thickness=2.2)
{
	for (screw=[1:count]) {
		rotate([0,0,screw*360/count])
		translate([radius,0,-1])
		cylinder(d=size, h=thickness+2);
	}
}

module squareScrews(w=10, h=10, size=3.3, thickness=2.2) {
	for (X=[-w/2, w/2])
	for (Y=[-h/2, h/2])
	translate([X,Y,-1])		
		cylinder(d=size, h=thickness+2);
}
// file: ../parts.scad
include <config.scad>;
use <../util/screws.scad>;
use <../parts/body.scad>;
use <../parts/head.scad>;
use <../parts/u.scad>;
use <../parts/side.scad>;
use <../parts/leg.scad>;

module metabot_u(print=false) {
    metabot_colorize()
        u(UHeight, URadius, Thickness, UScrewsSpacing, UScrewsDiameter, print=print);
}

module metabot_body_screws() {
	squareScrews(BodyScrewsW, BodyScrewsH, BodyScrewsSize, Thickness);
}

module metabot_body(print=false, type="top") {
    metabot_colorize()
    body(BodyThickness, print=print, type=type);
}

module metabot_side(print=false) {
    metabot_colorize()
        side(SideSize, SideHolesToBorder, Thickness, print=print);
}

module metabot_head(print=false) {
    metabot_colorize()
        head(HeadHeight, Thickness, print=print);
}
// file: ../config.scad
// Color of the parts, for rendering
PartsColor = [0.8, 0.8, 0.8];

// Head height
HeadHeight=30;

// Thickness of parts (2.2 is good for Ollo rivets)
Thickness = 2.2;
BodyThickness = 3;

// Sizes of the parts of the leg
// Ratio of leg parts
LegSize = 100;
LegSizeA = (0.60)*LegSize;
LegSizeB = (0.20)*LegSize;
LegSizeC = (0.20)*LegSize;

// Width of the bottom part of the leg
LegSizeBottom = 10;

// Size of the "top" part of the legs, in mm
LegSizeTop = 30;

// Motor dimensions
MotorWidth = 24;
MotorHeight = 36;
MotorDepth = 24;
MotorArmOffset = 9;

// U dimensions
UHeight = 15.2;
URadius = 8;
UWidth = 30+Thickness/2;
UTotalHeight = UHeight+URadius;
UScrewsSpacing = 10;
UScrewsDiameter= 3.3;

// Side dimensions
SideSize = 35;
SideHolesToBorder = 5;

// Defining the resolution
$fn=35;

module metabot_colorize() {
    color(PartsColor)
        children();
}
// main file
include <../config.scad>;
use <../parts.scad>;

metabot_body(print=true, type="bottom");
